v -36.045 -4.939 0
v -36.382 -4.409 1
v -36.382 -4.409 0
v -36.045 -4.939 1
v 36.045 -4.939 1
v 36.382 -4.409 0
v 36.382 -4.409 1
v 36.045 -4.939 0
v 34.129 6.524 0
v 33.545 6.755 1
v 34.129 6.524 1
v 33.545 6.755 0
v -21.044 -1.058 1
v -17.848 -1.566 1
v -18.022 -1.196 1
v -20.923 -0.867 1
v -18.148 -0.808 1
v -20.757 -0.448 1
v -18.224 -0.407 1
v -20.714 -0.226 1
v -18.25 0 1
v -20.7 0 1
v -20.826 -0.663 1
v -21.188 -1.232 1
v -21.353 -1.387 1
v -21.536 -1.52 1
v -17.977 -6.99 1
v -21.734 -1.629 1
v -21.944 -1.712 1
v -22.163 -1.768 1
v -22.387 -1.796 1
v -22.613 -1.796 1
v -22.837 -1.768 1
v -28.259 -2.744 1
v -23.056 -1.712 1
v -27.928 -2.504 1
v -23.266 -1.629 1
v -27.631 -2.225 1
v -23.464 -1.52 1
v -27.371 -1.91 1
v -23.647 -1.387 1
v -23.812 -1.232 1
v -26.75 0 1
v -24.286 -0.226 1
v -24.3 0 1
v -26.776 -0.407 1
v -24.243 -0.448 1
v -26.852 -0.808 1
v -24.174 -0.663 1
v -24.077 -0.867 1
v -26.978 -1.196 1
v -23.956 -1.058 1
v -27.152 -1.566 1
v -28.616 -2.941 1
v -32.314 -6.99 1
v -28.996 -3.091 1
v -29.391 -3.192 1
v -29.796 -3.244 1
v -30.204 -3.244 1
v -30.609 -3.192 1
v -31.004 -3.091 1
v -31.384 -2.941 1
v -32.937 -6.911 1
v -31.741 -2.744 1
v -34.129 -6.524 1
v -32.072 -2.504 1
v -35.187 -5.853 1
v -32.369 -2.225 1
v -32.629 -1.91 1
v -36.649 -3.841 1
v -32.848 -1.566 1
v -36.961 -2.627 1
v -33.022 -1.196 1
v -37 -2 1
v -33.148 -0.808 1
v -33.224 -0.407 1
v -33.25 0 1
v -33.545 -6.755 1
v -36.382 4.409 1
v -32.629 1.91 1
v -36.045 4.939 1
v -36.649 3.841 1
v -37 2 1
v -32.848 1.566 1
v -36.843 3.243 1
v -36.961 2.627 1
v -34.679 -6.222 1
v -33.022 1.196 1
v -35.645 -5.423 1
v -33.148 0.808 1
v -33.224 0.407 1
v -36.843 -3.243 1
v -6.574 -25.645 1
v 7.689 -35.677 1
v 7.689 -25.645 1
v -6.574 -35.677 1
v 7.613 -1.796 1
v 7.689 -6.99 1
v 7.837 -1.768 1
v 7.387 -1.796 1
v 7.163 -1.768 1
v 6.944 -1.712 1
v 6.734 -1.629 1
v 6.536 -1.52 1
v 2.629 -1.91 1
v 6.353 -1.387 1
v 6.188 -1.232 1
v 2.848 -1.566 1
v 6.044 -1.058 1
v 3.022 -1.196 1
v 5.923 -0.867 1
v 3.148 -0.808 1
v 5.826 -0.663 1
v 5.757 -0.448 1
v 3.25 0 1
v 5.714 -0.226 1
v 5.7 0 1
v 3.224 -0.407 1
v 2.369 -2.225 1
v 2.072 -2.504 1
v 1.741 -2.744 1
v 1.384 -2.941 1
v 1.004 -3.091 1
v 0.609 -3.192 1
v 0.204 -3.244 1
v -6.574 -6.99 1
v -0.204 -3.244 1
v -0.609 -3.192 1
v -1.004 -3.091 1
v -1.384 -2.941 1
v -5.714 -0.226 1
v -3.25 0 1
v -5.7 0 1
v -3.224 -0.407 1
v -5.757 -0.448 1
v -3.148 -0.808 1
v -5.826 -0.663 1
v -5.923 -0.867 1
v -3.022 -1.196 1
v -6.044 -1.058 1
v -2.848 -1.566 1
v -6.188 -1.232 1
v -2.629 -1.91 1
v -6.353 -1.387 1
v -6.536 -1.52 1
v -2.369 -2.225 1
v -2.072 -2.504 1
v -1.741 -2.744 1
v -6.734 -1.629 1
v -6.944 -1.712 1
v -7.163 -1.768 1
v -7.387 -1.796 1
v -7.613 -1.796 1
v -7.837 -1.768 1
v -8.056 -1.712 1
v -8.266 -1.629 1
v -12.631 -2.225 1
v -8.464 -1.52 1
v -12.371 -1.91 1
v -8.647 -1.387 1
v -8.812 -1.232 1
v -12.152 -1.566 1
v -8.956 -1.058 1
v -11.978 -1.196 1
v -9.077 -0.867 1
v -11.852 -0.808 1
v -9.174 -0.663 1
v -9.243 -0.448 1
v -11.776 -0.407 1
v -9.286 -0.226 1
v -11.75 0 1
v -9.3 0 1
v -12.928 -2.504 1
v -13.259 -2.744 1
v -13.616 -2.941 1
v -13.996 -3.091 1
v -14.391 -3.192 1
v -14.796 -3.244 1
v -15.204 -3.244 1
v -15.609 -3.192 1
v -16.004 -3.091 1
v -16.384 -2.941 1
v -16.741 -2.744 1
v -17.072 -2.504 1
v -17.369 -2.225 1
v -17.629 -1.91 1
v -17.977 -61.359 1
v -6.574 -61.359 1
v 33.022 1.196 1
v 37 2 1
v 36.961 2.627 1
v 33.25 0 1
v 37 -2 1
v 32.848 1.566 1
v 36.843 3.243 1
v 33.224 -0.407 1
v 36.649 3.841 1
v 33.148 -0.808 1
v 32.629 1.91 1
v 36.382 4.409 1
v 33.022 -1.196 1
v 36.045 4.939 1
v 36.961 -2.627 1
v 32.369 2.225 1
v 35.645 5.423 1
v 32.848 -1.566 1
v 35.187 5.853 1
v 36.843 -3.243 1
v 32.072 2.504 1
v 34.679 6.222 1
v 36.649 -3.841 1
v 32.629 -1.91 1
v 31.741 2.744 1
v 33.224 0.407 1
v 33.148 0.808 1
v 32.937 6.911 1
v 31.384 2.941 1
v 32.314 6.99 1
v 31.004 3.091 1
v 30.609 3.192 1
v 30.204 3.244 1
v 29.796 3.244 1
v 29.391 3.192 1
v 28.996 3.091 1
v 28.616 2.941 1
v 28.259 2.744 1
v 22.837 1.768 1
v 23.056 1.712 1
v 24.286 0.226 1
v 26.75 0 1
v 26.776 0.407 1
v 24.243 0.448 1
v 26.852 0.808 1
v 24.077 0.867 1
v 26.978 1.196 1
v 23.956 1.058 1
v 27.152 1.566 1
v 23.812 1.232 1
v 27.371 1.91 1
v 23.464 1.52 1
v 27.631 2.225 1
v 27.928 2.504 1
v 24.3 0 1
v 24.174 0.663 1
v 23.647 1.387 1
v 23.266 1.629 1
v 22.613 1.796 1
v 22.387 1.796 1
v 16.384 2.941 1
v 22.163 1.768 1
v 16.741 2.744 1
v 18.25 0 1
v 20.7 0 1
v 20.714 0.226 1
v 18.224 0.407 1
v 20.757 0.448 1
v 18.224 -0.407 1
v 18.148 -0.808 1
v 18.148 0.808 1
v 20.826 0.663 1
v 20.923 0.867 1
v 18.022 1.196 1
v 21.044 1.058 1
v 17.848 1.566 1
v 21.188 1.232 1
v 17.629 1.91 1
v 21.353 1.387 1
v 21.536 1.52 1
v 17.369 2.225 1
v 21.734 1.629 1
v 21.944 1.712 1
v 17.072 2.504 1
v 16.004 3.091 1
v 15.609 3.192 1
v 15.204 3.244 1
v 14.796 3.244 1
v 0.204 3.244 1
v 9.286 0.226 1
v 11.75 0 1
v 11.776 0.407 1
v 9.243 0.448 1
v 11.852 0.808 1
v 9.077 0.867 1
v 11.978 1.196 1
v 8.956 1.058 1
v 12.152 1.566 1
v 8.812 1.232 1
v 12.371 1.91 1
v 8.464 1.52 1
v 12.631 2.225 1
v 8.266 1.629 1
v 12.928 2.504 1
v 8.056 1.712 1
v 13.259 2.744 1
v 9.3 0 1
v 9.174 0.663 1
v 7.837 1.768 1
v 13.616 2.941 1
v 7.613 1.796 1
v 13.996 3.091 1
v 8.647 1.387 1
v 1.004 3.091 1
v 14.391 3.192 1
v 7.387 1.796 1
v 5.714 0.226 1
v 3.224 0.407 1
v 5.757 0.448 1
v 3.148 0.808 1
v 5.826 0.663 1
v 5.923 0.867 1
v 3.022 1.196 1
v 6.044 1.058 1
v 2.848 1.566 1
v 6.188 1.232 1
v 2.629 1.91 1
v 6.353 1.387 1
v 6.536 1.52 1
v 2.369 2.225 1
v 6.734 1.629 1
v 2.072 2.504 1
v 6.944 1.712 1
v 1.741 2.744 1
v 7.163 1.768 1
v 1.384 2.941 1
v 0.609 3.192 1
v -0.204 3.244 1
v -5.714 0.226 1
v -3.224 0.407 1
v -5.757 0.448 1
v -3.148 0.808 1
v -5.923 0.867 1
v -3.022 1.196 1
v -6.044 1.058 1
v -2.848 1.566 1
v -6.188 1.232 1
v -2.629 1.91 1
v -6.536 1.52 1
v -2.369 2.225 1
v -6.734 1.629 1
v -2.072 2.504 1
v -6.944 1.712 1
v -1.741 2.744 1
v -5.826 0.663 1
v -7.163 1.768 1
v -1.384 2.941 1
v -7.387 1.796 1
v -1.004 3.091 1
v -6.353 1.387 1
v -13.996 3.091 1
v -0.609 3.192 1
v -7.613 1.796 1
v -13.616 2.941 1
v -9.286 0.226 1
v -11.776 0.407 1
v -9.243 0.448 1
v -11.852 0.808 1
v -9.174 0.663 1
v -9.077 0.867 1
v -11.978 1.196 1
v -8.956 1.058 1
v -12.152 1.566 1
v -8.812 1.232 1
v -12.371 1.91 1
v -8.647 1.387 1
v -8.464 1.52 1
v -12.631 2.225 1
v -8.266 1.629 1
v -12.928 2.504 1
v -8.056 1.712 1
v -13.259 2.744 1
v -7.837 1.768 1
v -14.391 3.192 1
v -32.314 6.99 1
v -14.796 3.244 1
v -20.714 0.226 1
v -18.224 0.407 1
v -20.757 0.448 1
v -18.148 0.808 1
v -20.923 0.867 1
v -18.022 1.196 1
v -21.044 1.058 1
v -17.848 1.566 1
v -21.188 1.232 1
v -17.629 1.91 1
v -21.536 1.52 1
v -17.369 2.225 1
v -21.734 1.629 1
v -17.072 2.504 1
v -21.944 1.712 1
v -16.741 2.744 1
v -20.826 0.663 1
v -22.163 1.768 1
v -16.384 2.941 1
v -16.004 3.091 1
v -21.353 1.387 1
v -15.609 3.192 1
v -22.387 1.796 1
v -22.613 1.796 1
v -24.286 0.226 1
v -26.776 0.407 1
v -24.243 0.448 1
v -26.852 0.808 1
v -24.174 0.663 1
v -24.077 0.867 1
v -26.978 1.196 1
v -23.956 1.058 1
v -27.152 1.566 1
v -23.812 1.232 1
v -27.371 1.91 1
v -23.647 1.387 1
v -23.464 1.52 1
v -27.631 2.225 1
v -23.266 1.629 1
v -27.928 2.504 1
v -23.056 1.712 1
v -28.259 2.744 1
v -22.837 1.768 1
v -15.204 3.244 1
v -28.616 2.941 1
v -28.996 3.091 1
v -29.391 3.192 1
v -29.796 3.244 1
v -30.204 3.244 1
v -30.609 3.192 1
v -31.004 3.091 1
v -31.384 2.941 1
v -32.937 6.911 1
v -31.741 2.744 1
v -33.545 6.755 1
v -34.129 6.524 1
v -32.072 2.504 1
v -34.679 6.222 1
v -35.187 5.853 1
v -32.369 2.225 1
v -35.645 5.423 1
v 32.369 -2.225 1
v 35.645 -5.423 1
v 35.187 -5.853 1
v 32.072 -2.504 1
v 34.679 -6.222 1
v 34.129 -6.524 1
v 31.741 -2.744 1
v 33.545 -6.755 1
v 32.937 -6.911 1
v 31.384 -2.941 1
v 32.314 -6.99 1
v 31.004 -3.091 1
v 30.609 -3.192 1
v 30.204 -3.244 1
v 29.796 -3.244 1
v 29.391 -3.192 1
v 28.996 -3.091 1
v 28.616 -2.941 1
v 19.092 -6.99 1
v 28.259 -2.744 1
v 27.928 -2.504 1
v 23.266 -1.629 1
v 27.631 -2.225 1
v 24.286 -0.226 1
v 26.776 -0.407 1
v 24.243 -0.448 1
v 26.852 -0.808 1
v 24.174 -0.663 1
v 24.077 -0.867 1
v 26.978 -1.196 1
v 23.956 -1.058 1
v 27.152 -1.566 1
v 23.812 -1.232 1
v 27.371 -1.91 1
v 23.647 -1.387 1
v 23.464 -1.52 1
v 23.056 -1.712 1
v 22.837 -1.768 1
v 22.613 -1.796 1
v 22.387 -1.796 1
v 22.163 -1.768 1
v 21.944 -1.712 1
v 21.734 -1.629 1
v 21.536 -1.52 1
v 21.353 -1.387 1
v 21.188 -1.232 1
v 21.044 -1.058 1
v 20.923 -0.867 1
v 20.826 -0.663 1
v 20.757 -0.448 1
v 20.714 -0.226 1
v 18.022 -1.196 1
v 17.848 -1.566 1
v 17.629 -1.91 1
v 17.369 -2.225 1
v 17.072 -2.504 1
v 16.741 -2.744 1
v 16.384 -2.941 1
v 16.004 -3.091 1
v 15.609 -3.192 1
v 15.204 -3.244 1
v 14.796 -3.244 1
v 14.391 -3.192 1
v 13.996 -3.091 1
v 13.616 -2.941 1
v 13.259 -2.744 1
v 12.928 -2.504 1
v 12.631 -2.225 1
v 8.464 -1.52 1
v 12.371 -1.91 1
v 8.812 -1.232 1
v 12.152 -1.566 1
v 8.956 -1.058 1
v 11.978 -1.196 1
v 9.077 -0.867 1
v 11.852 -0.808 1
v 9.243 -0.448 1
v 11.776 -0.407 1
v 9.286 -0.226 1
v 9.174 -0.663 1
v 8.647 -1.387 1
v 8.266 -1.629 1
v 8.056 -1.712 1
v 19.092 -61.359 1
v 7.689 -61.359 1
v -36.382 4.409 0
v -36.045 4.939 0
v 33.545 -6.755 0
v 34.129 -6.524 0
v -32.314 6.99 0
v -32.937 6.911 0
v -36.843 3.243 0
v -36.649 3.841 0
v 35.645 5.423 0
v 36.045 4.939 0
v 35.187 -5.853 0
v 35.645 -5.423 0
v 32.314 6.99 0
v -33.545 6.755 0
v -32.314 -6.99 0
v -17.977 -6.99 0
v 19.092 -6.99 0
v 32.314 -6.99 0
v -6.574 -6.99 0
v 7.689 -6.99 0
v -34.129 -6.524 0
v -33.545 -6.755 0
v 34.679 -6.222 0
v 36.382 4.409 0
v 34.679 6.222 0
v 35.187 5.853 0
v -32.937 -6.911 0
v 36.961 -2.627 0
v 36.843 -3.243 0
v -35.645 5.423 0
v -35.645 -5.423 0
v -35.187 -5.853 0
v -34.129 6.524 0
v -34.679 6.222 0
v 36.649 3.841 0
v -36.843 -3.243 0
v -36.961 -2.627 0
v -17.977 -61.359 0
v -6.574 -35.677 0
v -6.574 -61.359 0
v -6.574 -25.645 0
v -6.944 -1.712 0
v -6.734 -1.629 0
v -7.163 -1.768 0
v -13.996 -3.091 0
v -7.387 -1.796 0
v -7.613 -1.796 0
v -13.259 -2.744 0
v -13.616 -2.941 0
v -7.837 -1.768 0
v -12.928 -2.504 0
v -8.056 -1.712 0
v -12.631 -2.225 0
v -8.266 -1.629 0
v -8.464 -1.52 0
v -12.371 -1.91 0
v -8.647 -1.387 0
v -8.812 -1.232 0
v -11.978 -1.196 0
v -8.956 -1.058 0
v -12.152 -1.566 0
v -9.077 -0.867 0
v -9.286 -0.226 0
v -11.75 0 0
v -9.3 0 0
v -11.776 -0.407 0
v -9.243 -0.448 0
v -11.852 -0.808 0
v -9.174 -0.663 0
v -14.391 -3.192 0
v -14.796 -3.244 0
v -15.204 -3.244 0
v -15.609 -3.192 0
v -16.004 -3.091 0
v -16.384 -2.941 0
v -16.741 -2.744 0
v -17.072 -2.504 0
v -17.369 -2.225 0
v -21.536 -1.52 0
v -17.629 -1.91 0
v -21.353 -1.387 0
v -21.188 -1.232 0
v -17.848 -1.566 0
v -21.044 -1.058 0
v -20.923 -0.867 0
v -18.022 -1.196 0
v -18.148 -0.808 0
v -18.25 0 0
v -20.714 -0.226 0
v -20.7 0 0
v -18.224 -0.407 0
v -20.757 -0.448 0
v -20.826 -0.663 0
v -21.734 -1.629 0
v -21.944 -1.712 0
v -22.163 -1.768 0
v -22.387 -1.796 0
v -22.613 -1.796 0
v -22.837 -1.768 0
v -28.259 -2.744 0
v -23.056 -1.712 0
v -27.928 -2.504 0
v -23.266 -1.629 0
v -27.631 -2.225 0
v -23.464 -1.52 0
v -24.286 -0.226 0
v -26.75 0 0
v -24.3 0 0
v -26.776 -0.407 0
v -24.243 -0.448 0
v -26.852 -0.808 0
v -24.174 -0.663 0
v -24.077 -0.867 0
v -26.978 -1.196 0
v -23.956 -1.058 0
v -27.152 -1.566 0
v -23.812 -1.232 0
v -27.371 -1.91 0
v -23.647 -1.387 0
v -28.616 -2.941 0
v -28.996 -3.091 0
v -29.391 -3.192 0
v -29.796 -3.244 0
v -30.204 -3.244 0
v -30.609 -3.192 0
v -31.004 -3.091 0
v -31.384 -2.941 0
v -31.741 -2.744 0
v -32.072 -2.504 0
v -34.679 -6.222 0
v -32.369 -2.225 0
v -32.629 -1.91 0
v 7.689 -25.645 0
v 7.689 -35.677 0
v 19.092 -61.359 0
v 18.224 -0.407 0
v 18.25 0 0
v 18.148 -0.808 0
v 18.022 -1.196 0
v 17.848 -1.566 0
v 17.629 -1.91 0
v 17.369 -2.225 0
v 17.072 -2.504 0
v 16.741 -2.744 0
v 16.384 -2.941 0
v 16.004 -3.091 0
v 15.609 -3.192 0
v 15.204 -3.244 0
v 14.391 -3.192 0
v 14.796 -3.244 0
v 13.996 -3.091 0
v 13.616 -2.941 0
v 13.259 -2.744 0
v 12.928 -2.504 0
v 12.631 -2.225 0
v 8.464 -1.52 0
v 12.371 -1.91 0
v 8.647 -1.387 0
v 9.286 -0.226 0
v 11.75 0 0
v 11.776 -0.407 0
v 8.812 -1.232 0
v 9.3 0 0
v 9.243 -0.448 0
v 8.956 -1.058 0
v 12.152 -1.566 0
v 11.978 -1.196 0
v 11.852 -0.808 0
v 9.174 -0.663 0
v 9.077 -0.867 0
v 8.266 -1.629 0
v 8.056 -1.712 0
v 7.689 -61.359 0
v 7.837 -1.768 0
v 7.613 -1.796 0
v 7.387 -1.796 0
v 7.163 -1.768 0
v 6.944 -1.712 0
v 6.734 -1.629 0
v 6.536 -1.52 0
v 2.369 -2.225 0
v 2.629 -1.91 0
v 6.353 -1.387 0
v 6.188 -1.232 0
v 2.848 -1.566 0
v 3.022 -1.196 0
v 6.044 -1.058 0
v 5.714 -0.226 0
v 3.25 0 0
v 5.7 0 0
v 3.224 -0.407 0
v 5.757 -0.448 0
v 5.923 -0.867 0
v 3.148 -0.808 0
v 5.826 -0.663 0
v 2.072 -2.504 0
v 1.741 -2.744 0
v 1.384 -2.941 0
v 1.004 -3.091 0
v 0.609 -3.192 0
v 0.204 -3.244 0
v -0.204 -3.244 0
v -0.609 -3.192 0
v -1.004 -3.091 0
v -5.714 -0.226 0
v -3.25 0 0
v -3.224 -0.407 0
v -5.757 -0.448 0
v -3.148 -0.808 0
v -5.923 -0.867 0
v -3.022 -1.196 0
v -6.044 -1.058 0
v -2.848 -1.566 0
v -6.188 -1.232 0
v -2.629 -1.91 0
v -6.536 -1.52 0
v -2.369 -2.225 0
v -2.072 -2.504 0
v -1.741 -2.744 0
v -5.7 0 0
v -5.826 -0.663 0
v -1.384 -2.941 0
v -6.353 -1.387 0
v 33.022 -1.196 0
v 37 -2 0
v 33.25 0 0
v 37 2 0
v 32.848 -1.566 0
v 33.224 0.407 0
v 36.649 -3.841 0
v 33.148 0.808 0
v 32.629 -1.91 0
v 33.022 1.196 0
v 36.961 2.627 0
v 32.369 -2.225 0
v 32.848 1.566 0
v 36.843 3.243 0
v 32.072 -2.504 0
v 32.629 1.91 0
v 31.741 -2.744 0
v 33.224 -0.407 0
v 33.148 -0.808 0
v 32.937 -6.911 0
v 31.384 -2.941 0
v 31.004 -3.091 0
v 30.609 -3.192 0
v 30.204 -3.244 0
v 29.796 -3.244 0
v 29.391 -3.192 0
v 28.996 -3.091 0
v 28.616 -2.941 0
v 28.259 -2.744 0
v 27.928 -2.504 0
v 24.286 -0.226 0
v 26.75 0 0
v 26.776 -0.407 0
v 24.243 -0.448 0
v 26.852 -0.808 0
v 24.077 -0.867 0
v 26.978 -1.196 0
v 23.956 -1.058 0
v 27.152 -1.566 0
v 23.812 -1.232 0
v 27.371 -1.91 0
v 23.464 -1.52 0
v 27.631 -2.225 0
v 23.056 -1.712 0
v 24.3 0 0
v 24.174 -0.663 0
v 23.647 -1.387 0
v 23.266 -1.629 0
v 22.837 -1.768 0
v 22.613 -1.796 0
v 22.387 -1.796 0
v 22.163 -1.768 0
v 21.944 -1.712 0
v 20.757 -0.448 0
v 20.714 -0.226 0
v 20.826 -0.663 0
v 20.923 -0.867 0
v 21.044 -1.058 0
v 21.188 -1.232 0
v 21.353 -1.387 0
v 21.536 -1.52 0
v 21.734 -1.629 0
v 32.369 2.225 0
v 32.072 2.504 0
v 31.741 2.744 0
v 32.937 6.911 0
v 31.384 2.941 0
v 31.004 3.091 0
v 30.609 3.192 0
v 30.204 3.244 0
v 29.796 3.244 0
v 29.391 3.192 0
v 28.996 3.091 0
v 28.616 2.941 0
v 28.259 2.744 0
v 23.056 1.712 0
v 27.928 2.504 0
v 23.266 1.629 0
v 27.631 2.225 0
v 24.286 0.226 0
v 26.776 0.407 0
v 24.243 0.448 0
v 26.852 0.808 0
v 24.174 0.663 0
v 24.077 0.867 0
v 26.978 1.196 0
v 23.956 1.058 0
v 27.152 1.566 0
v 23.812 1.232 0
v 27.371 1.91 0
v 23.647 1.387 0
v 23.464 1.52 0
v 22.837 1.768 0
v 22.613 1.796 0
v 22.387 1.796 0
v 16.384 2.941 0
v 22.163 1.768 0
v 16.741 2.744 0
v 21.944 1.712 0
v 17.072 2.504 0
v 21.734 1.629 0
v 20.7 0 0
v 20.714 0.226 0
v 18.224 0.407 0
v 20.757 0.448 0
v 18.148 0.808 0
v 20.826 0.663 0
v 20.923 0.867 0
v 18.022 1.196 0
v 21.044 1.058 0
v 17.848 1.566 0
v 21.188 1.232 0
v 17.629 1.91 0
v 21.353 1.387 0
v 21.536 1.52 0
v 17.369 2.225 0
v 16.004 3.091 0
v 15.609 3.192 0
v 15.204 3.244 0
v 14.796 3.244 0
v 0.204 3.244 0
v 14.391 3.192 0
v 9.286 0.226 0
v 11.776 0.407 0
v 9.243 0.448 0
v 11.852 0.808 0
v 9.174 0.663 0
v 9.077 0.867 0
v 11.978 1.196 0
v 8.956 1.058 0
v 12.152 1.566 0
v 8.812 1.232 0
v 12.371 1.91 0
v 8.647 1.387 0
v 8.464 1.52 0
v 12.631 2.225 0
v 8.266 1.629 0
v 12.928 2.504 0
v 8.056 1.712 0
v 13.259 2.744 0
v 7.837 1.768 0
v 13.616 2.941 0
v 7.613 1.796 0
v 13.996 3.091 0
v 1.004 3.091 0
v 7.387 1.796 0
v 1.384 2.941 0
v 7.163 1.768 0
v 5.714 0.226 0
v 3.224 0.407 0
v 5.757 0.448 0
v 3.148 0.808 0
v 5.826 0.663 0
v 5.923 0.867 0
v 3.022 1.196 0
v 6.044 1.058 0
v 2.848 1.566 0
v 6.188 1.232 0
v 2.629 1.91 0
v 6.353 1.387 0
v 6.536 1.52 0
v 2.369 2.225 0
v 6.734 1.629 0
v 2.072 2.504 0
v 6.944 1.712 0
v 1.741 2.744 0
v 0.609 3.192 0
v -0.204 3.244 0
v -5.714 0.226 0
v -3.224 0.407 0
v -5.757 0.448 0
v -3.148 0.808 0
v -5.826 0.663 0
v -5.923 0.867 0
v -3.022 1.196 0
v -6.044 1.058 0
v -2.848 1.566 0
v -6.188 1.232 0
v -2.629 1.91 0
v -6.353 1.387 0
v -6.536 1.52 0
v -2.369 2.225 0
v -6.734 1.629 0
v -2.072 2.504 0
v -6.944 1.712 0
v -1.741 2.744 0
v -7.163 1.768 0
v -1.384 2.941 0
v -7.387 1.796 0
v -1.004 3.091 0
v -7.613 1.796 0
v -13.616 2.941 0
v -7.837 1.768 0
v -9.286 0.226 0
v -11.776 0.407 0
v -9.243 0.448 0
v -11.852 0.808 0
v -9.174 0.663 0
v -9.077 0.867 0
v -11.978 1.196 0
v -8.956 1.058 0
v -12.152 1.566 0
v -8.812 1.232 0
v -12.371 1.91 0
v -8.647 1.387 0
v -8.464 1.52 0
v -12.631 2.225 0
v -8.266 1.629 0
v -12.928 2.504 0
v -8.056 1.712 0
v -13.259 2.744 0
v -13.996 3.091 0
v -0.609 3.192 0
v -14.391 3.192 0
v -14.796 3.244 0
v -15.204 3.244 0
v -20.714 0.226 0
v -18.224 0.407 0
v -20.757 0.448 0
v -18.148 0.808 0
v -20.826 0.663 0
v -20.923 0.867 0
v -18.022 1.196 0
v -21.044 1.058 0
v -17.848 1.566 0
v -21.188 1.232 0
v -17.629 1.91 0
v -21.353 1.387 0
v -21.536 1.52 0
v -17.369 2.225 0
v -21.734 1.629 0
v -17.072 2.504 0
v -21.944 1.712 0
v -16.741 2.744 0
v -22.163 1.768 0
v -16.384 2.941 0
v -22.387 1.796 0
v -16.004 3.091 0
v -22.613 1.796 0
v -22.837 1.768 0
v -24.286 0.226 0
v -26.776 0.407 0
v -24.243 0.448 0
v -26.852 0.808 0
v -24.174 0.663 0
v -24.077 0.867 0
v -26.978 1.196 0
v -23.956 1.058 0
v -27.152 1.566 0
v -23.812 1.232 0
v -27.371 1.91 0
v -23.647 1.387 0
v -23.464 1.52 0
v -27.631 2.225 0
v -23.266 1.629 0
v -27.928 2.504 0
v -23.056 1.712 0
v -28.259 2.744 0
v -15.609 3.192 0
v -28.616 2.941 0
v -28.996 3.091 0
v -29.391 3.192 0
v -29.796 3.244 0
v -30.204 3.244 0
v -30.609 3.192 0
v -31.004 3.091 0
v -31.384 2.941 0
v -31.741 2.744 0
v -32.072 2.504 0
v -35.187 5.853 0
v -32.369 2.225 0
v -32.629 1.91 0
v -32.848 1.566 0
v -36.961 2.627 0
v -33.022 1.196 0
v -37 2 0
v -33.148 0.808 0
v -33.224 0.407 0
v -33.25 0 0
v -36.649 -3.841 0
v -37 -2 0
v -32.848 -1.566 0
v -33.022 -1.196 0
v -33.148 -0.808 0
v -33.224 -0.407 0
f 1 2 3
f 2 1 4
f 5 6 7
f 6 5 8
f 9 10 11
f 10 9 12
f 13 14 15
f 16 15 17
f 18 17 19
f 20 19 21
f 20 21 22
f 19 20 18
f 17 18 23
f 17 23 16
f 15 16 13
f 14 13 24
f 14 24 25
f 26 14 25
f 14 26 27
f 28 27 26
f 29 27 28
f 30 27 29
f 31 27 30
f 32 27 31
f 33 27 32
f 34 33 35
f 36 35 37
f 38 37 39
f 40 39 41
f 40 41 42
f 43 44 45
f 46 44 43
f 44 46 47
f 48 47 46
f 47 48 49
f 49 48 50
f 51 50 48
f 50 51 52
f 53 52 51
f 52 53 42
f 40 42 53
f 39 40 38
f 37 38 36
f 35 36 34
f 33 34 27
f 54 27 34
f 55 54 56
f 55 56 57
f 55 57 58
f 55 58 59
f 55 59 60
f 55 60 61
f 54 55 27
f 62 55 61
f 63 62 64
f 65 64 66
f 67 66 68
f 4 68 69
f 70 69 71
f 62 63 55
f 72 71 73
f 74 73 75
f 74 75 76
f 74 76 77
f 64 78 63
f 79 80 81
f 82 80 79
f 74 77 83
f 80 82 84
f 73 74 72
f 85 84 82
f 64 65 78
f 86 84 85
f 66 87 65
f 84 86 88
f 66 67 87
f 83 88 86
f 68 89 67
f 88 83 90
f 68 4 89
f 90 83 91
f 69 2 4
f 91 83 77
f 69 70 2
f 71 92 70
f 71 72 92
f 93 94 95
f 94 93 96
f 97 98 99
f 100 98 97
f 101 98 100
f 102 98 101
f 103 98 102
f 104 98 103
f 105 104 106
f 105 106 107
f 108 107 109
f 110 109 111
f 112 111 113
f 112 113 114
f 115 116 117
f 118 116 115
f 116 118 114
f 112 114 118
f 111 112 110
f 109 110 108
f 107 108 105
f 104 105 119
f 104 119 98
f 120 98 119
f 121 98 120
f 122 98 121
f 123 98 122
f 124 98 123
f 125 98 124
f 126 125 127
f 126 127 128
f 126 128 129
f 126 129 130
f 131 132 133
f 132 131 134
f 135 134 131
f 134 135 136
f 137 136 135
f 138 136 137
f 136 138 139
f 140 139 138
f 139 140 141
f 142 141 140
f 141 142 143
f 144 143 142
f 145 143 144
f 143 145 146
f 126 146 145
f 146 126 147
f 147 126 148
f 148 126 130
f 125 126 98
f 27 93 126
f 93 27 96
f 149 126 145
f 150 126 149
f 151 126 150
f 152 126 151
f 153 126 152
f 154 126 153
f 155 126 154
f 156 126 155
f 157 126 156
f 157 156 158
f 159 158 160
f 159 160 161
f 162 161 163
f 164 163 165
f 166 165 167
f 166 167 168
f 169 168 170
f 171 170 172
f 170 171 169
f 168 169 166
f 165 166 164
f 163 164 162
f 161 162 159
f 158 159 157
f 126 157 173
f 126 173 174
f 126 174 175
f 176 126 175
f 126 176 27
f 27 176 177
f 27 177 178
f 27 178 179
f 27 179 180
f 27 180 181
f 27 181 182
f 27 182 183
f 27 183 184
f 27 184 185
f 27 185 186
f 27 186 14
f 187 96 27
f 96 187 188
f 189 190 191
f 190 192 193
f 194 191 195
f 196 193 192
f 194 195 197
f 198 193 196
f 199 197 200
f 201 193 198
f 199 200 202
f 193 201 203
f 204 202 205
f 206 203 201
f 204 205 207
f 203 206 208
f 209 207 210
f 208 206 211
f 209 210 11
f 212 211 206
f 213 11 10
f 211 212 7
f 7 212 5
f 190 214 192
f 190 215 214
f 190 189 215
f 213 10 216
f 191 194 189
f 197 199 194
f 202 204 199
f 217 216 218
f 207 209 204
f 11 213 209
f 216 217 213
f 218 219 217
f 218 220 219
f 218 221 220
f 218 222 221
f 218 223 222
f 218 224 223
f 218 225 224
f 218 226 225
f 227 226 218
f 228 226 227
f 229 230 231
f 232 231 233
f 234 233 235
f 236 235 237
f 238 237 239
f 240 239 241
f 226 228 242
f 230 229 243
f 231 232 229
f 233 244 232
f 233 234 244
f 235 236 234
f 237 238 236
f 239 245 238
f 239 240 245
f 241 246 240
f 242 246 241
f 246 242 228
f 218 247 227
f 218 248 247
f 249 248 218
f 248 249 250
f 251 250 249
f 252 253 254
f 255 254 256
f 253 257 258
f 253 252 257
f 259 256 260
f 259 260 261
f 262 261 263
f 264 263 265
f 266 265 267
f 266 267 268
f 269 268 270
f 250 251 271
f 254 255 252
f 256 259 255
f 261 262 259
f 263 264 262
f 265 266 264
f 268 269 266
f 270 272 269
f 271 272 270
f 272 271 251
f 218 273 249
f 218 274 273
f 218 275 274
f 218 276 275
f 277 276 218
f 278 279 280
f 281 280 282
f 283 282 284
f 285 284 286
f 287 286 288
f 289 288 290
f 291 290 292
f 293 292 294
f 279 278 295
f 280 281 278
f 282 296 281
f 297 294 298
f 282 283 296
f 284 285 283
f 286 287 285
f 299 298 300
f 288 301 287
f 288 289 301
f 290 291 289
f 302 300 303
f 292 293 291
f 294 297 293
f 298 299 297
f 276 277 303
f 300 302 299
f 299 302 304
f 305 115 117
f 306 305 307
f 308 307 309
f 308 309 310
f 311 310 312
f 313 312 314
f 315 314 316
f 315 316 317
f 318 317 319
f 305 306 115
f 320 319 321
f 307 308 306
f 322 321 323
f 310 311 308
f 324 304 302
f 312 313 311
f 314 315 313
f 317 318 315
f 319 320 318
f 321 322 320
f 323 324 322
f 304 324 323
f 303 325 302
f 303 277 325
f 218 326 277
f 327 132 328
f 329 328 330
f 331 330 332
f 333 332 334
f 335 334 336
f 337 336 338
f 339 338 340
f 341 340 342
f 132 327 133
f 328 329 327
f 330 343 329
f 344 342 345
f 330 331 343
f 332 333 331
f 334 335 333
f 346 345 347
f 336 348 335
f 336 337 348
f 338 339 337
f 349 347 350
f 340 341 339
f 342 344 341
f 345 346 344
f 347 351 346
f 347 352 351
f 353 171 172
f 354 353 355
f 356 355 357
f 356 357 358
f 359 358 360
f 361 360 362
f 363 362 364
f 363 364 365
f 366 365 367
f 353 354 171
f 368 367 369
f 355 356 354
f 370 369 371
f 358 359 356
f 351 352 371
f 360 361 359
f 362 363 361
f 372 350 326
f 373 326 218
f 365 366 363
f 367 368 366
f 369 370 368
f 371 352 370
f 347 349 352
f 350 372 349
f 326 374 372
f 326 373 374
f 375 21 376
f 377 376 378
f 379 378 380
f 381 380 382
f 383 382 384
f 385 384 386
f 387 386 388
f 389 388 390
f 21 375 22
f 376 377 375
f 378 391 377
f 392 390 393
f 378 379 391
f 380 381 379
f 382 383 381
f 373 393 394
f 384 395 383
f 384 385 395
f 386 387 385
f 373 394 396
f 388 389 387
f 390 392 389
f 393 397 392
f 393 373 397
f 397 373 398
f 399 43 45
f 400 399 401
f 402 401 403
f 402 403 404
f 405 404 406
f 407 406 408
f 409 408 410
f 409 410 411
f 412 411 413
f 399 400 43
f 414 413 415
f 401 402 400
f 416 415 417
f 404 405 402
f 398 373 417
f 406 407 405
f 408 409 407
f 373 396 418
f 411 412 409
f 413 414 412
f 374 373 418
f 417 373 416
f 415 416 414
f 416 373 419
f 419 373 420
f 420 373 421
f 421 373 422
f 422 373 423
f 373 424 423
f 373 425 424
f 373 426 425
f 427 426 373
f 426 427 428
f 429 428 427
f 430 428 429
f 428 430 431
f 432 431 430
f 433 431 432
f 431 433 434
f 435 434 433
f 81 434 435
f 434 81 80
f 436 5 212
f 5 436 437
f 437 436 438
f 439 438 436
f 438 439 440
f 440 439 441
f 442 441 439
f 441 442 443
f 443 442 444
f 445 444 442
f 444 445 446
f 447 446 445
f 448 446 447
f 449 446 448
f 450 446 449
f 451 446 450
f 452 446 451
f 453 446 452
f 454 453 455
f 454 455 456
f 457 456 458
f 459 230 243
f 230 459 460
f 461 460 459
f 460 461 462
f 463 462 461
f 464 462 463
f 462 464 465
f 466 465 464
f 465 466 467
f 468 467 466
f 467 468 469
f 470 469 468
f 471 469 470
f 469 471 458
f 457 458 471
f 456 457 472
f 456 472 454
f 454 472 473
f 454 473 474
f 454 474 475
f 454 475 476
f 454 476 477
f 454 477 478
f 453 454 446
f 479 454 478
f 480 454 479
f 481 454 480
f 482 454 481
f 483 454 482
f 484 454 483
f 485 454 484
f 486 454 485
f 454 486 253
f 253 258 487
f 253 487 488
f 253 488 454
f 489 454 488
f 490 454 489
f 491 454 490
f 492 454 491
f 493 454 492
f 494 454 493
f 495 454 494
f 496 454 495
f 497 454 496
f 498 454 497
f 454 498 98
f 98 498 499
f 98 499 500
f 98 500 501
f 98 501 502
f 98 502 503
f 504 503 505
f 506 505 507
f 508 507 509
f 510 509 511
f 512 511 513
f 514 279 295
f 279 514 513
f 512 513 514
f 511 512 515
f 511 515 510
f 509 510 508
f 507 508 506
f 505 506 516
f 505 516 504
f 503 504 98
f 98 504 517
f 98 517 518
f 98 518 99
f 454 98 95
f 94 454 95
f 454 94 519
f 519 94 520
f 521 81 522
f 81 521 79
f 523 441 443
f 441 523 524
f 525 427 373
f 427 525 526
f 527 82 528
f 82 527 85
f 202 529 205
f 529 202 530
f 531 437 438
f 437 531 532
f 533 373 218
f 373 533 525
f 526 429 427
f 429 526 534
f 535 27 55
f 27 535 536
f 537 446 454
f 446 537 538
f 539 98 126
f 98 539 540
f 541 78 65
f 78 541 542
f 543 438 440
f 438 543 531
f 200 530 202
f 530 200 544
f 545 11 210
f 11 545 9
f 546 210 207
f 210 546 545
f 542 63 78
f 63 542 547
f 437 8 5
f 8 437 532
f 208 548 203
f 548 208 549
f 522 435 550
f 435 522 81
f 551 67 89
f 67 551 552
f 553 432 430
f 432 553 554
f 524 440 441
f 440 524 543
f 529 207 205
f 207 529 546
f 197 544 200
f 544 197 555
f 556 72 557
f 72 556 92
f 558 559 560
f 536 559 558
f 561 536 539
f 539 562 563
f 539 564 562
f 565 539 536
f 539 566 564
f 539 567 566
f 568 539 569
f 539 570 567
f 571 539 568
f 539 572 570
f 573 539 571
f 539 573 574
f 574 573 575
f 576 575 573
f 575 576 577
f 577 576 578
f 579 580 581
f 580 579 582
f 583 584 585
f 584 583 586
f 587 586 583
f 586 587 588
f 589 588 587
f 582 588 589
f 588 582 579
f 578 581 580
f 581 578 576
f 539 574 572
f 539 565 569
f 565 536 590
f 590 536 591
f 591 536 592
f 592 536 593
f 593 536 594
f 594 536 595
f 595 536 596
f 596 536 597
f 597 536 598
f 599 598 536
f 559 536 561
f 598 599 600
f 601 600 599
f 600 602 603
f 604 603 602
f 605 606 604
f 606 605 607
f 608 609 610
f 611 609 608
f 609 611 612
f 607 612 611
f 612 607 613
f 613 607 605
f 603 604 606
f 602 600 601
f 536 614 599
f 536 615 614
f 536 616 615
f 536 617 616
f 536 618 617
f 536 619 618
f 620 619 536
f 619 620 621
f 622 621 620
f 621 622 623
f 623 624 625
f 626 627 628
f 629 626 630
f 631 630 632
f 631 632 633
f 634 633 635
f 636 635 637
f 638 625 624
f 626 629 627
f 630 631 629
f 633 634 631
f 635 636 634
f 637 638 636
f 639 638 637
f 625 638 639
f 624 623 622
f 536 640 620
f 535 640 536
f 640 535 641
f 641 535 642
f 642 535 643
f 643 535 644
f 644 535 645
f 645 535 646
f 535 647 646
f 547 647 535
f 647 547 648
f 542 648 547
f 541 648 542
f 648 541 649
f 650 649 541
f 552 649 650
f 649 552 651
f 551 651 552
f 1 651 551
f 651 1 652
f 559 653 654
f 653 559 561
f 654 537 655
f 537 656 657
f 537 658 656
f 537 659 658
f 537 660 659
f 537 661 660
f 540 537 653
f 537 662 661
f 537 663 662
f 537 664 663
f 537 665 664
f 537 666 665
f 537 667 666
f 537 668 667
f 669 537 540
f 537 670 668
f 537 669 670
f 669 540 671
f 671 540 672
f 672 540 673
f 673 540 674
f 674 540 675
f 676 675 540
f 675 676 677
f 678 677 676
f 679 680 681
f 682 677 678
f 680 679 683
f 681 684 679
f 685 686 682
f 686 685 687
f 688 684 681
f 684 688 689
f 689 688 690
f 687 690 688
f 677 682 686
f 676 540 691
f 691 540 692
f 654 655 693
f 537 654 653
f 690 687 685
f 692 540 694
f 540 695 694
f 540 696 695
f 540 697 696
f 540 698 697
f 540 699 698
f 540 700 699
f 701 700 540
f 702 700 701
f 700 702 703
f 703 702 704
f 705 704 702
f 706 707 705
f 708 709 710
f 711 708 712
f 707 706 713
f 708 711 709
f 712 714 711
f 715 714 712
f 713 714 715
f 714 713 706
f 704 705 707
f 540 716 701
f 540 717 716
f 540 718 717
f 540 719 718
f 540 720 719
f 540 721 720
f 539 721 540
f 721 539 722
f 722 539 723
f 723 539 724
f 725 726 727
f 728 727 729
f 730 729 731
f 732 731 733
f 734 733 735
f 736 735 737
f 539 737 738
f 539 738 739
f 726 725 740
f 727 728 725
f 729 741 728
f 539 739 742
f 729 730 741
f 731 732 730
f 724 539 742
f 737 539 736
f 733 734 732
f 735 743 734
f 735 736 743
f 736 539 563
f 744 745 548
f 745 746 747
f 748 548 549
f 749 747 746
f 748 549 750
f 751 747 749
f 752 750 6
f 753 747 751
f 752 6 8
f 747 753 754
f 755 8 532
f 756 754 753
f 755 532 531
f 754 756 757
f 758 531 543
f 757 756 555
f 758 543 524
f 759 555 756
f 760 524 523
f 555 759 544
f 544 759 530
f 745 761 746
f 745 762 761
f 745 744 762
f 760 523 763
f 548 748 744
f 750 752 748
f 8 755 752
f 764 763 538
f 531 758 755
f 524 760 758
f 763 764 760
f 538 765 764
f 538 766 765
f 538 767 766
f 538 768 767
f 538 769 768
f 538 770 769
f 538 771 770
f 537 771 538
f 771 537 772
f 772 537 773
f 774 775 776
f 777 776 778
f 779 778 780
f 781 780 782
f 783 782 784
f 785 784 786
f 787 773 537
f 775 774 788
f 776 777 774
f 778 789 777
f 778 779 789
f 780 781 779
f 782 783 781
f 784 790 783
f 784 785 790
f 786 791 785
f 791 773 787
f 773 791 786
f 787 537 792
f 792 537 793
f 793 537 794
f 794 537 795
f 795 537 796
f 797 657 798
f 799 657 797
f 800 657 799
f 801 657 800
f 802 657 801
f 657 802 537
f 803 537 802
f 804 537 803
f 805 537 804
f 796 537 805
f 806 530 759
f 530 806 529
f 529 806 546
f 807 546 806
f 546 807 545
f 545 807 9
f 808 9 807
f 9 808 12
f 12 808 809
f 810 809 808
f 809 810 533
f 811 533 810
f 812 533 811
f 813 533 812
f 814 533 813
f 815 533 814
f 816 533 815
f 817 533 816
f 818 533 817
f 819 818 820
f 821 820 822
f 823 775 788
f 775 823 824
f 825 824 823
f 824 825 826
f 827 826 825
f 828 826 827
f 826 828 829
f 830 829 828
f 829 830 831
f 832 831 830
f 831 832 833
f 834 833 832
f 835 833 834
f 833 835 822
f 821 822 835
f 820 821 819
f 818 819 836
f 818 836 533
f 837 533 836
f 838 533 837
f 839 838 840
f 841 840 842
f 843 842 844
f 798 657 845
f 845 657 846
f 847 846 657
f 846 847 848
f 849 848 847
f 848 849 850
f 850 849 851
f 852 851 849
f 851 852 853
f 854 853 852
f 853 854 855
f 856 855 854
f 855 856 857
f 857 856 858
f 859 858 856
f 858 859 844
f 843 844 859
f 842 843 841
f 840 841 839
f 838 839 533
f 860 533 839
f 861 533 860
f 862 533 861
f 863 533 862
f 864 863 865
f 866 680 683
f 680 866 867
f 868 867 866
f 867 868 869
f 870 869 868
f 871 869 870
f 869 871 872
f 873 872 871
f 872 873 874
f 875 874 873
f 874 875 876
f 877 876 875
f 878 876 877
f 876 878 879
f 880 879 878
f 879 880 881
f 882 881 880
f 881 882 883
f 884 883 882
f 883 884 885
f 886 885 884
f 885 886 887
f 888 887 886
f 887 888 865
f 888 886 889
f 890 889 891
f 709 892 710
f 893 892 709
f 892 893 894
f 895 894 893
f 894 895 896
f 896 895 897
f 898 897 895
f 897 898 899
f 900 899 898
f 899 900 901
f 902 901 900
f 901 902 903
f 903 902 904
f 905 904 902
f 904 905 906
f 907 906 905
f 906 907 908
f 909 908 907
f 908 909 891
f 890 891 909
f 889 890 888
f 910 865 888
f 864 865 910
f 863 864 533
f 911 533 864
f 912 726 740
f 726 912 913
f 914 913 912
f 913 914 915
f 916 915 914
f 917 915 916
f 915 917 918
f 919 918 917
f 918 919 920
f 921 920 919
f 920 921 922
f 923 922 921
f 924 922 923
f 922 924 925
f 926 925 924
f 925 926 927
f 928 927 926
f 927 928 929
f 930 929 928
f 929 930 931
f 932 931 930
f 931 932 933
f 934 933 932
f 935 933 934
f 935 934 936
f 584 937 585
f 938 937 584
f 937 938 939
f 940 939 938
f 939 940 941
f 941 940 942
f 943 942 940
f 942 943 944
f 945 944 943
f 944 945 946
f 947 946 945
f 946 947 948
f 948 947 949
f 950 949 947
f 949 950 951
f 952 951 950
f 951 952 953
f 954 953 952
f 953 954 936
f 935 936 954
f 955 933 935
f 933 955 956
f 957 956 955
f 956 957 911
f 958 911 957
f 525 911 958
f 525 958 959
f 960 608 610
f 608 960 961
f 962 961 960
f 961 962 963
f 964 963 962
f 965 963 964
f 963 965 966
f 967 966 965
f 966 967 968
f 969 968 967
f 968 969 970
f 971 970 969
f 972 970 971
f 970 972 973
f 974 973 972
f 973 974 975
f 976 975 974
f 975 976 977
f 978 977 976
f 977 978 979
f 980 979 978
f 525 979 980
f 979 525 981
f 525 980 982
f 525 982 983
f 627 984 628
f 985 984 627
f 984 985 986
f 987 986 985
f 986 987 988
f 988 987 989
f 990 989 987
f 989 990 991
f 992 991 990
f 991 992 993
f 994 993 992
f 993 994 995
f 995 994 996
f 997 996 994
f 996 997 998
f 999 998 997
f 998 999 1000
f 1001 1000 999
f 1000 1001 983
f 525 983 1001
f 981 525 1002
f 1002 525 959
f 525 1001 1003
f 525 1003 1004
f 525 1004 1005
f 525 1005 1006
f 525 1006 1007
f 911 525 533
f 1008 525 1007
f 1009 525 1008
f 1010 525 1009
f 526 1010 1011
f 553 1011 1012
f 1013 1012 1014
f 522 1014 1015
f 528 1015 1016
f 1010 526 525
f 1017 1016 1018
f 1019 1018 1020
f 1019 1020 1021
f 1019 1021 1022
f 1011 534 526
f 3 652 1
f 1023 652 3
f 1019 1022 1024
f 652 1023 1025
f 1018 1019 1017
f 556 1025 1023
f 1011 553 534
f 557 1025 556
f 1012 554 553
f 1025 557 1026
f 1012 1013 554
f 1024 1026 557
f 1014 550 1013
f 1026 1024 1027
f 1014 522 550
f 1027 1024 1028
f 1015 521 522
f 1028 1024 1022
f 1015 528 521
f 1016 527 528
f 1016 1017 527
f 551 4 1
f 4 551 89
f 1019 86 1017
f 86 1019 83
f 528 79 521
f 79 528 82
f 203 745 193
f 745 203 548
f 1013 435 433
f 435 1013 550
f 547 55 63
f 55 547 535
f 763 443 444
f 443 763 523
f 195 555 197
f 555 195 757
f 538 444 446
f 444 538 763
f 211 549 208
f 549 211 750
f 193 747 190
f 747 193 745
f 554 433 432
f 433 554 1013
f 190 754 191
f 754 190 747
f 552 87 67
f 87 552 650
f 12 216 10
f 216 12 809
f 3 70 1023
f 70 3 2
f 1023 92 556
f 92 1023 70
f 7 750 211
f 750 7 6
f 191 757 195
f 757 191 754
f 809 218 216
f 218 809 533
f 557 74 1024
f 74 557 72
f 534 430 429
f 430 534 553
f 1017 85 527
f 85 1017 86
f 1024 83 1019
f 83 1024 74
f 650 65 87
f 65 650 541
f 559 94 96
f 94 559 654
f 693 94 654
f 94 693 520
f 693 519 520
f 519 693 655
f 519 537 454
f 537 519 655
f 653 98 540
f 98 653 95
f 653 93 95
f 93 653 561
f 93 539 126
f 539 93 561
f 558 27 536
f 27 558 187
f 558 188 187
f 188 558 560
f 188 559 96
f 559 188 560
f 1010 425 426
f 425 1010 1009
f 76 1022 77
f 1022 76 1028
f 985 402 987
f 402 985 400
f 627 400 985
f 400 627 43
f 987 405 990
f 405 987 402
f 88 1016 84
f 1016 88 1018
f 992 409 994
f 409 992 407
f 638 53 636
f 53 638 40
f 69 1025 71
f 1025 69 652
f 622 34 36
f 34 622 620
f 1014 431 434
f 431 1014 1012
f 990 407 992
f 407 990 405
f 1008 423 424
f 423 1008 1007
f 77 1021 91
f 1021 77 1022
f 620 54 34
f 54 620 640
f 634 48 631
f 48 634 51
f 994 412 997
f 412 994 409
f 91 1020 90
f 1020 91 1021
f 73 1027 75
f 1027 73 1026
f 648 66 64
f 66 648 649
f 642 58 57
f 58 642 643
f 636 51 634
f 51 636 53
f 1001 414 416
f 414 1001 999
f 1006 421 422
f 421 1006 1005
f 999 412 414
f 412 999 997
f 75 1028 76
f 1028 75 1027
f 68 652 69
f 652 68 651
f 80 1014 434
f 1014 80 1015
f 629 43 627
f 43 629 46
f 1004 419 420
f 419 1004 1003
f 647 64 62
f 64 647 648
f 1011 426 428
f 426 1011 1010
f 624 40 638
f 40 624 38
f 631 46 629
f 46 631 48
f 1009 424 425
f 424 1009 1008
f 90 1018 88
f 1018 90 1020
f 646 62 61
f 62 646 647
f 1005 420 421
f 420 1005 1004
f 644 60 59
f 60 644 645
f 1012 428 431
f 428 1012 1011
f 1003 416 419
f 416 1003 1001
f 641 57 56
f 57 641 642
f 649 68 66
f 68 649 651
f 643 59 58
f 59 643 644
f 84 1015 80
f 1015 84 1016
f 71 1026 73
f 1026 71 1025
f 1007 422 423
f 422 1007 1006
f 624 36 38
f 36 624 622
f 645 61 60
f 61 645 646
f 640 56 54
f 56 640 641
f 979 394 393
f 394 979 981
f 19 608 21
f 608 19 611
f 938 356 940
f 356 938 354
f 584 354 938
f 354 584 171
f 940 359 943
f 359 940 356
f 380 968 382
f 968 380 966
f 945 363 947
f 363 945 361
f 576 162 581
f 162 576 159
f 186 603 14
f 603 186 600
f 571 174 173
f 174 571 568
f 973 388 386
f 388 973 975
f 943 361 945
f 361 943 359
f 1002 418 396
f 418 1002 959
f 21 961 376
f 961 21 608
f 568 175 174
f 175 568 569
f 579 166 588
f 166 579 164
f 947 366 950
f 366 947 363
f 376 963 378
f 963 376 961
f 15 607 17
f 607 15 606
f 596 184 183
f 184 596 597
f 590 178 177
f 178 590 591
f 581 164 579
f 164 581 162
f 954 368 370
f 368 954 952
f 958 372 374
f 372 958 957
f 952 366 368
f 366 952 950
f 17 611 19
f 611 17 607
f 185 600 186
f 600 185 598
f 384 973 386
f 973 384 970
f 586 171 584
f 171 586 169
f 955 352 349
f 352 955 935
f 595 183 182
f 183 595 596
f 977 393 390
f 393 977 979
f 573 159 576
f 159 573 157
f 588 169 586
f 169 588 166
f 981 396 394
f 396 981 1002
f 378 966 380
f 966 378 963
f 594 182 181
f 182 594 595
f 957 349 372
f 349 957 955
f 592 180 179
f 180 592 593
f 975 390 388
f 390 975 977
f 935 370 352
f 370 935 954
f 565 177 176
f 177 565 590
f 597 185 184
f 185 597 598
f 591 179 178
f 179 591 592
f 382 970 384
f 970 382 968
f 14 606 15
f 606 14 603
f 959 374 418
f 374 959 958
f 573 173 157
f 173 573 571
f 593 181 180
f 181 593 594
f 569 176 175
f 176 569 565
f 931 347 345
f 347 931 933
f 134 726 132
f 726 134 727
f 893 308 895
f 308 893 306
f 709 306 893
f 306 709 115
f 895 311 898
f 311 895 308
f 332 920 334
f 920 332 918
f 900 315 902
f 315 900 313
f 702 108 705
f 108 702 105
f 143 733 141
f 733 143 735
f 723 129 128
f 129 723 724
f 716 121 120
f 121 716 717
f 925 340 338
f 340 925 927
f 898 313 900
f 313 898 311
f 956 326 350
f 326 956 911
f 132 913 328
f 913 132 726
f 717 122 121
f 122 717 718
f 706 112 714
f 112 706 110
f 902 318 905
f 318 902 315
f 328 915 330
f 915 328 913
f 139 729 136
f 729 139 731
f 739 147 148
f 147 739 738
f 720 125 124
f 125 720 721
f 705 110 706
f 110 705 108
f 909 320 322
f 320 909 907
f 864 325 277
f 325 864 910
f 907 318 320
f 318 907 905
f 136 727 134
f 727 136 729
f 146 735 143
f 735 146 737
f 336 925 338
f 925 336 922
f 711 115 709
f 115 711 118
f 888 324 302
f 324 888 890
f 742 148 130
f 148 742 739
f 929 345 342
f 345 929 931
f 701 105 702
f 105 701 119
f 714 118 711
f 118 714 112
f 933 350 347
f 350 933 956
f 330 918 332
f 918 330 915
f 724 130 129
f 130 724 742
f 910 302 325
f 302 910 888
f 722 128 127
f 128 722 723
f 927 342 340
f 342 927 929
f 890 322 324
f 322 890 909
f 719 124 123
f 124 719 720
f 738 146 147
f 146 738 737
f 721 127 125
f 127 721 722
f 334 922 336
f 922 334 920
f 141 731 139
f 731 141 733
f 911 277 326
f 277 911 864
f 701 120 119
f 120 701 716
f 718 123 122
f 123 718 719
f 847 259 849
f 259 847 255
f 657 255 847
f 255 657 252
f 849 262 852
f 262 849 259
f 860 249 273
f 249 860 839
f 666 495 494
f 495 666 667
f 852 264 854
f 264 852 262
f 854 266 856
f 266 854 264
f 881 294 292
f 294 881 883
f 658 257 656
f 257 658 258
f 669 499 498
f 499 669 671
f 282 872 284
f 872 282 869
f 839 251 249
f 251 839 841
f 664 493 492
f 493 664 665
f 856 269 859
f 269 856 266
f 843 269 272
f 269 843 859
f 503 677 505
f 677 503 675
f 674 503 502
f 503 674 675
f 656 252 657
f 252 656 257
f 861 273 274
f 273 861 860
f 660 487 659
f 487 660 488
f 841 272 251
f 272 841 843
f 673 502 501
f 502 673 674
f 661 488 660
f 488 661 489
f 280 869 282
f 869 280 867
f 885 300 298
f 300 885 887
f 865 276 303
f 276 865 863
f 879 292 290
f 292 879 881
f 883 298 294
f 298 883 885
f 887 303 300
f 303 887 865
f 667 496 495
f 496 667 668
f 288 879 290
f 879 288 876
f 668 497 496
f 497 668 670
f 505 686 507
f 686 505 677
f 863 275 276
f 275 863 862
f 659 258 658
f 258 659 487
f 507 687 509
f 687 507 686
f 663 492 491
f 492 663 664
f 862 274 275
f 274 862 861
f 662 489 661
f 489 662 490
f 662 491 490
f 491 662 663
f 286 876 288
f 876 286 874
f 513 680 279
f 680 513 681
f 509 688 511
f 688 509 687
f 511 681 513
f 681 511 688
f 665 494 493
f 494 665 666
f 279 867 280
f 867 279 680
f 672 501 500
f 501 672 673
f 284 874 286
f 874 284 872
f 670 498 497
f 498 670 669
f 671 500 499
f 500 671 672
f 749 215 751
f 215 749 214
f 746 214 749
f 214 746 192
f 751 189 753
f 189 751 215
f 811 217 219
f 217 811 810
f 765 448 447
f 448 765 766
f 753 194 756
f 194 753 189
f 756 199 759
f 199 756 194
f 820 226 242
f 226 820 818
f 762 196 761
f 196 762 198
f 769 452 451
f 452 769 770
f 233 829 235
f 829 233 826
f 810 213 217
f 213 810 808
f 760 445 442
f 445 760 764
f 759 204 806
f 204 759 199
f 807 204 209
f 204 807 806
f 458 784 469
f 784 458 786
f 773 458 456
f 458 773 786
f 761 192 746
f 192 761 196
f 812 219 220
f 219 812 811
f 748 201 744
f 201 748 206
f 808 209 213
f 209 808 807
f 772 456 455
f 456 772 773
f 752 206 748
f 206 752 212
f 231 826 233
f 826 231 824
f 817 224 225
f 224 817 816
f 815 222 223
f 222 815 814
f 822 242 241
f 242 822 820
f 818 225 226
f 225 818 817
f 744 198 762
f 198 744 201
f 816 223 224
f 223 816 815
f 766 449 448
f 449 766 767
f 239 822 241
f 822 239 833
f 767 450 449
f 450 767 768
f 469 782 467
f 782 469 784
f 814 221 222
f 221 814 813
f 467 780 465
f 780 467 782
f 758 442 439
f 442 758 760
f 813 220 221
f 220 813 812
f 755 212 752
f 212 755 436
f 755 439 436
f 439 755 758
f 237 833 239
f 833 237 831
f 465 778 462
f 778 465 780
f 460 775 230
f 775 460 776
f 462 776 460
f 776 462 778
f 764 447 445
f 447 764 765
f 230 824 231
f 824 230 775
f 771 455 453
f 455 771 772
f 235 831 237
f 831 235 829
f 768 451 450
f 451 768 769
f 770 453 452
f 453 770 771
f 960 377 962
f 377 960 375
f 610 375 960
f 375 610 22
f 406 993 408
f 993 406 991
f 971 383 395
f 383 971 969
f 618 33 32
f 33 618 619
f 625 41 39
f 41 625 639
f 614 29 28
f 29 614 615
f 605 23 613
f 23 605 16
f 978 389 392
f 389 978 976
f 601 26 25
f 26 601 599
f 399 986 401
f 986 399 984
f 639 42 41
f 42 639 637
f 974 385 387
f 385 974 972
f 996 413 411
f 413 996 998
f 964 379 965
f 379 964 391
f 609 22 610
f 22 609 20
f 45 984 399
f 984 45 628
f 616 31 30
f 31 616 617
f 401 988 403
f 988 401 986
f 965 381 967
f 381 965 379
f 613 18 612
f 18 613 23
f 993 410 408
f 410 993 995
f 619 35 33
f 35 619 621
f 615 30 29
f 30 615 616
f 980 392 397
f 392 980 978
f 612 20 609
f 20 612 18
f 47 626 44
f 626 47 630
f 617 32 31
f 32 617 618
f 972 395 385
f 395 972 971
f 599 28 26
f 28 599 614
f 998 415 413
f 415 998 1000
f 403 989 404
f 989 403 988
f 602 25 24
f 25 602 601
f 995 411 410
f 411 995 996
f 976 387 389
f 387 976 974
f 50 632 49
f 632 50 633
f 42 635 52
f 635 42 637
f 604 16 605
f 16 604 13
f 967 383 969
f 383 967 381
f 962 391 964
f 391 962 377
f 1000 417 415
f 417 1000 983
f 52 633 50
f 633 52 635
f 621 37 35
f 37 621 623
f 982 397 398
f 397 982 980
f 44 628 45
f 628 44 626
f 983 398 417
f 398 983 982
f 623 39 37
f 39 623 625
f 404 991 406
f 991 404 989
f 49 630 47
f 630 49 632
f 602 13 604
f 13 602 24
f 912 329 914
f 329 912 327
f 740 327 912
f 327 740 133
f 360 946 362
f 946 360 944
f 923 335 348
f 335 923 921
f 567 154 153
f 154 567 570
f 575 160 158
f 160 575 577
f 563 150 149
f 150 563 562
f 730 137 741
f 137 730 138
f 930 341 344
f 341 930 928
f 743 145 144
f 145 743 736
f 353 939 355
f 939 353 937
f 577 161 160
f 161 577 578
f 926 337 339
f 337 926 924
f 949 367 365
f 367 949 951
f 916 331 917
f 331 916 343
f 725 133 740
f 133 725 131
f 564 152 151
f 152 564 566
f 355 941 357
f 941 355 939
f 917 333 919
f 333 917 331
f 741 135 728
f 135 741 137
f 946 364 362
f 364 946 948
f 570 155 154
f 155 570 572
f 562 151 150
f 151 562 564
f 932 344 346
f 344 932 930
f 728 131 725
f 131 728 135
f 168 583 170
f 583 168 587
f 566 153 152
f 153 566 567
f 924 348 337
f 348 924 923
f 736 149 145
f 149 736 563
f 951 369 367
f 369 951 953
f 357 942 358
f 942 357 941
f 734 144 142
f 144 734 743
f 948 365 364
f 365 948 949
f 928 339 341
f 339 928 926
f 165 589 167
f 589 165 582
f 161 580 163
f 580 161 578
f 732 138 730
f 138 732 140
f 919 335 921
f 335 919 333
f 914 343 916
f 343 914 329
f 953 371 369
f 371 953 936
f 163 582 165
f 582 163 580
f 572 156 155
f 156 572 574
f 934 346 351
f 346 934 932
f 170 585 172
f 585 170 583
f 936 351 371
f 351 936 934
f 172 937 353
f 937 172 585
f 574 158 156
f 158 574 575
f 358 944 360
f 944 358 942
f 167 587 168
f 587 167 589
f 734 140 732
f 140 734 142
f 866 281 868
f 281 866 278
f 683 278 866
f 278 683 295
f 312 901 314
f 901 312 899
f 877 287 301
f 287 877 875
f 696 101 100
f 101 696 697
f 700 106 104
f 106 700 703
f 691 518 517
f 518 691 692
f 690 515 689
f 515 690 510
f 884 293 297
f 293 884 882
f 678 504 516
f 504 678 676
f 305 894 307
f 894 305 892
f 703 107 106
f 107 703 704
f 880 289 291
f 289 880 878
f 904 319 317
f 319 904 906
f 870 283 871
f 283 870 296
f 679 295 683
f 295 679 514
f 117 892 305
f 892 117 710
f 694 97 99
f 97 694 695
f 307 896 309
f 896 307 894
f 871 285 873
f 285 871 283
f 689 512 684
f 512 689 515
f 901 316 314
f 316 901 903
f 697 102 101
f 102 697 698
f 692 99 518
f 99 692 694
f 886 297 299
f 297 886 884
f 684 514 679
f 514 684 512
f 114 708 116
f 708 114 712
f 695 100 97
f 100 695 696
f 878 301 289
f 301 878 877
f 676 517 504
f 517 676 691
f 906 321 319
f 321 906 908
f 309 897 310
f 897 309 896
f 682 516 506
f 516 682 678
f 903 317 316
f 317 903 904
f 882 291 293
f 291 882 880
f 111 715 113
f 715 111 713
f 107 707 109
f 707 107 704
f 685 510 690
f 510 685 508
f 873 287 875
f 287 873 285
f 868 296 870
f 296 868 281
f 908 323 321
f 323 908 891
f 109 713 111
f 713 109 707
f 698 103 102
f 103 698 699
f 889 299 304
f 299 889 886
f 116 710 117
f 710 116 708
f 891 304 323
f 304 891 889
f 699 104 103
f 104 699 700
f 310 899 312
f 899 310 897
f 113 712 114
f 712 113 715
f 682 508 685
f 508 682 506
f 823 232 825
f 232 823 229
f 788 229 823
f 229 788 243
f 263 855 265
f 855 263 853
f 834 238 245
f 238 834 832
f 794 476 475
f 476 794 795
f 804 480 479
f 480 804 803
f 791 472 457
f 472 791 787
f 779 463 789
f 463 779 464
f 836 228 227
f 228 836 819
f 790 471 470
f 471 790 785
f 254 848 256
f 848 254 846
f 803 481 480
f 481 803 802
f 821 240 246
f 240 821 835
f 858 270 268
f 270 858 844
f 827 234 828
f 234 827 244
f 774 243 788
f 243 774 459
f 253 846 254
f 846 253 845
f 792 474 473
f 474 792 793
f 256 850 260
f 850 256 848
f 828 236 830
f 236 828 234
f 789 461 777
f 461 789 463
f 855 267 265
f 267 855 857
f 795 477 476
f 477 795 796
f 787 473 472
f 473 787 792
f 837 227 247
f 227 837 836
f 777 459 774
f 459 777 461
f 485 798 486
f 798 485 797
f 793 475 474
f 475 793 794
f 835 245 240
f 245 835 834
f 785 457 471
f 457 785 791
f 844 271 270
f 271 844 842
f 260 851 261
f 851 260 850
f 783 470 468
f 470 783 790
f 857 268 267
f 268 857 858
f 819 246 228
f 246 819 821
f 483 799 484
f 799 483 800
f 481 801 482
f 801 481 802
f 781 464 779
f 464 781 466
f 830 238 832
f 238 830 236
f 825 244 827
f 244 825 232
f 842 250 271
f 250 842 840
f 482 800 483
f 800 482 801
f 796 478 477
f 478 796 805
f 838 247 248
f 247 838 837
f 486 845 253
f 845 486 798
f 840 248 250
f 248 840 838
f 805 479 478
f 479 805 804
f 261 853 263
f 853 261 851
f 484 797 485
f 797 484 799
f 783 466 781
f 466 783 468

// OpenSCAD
$fn = 50;


difference() {
	union() {
		*color(alpha = 1.0000000000, c = "gray") {
			translate(v = [0, 14, 0]) {
				linear_extrude(height = 1) {
					text(font = "Arial:style=Bold", halign = "center", size = 4.5000000000, text = "COMMENT description oobb_plate_shape_p_type_1_depth_5_width_1_thickness_h_extra_oobb_size", valign = "center");
				}
			}
		}
		hull() {
			translate(v = [-32.0000000000, 2.0000000000, 0]) {
				cylinder(h = 1, r = 5);
			}
			translate(v = [32.0000000000, 2.0000000000, 0]) {
				cylinder(h = 1, r = 5);
			}
			translate(v = [-32.0000000000, -2.0000000000, 0]) {
				cylinder(h = 1, r = 5);
			}
			translate(v = [32.0000000000, -2.0000000000, 0]) {
				cylinder(h = 1, r = 5);
			}
		}
		translate(v = [0, -5, 0]) {
			linear_extrude(height = 1) {
				text(font = "DejaVu Sans Mono:style=Bold", halign = "center", size = 57.0000000000, text = "H", valign = "top");
			}
		}
	}
	union() {
		*color(alpha = 1.0000000000, c = "gray") {
			translate(v = [0, 14, 0]) {
				linear_extrude(height = 1) {
					text(font = "Arial:style=Bold", halign = "center", size = 4.5000000000, text = "COMMENT description oobb_holes_shape_n_type_5_width_1_thickness_h_extra_oobb_size_1_height_'all'_holes_true_both_holes", valign = "center");
				}
			}
		}
		translate(v = [-30.0000000000, 0.0000000000, 0]) {
			translate(v = [0, 0, -50]) {
				cylinder(h = 100, r = 3.2500000000);
			}
		}
		translate(v = [-15.0000000000, 0.0000000000, 0]) {
			translate(v = [0, 0, -50]) {
				cylinder(h = 100, r = 3.2500000000);
			}
		}
		translate(v = [0, 0, -50]) {
			cylinder(h = 100, r = 3.2500000000);
		}
		translate(v = [15.0000000000, 0.0000000000, 0]) {
			translate(v = [0, 0, -50]) {
				cylinder(h = 100, r = 3.2500000000);
			}
		}
		translate(v = [30.0000000000, 0.0000000000, 0]) {
			translate(v = [0, 0, -50]) {
				cylinder(h = 100, r = 3.2500000000);
			}
		}
		translate(v = [-30.0000000000, 0.0000000000, 0]) {
			translate(v = [0, 0, -50]) {
				cylinder(h = 100, r = 1.8000000000);
			}
		}
		translate(v = [-22.5000000000, 0.0000000000, 0]) {
			translate(v = [0, 0, -50]) {
				cylinder(h = 100, r = 1.8000000000);
			}
		}
		translate(v = [-15.0000000000, 0.0000000000, 0]) {
			translate(v = [0, 0, -50]) {
				cylinder(h = 100, r = 1.8000000000);
			}
		}
		translate(v = [-7.5000000000, 0.0000000000, 0]) {
			translate(v = [0, 0, -50]) {
				cylinder(h = 100, r = 1.8000000000);
			}
		}
		translate(v = [0, 0, -50]) {
			cylinder(h = 100, r = 1.8000000000);
		}
		translate(v = [7.5000000000, 0.0000000000, 0]) {
			translate(v = [0, 0, -50]) {
				cylinder(h = 100, r = 1.8000000000);
			}
		}
		translate(v = [15.0000000000, 0.0000000000, 0]) {
			translate(v = [0, 0, -50]) {
				cylinder(h = 100, r = 1.8000000000);
			}
		}
		translate(v = [22.5000000000, 0.0000000000, 0]) {
			translate(v = [0, 0, -50]) {
				cylinder(h = 100, r = 1.8000000000);
			}
		}
		translate(v = [30.0000000000, 0.0000000000, 0]) {
			translate(v = [0, 0, -50]) {
				cylinder(h = 100, r = 1.8000000000);
			}
		}
	}
}
